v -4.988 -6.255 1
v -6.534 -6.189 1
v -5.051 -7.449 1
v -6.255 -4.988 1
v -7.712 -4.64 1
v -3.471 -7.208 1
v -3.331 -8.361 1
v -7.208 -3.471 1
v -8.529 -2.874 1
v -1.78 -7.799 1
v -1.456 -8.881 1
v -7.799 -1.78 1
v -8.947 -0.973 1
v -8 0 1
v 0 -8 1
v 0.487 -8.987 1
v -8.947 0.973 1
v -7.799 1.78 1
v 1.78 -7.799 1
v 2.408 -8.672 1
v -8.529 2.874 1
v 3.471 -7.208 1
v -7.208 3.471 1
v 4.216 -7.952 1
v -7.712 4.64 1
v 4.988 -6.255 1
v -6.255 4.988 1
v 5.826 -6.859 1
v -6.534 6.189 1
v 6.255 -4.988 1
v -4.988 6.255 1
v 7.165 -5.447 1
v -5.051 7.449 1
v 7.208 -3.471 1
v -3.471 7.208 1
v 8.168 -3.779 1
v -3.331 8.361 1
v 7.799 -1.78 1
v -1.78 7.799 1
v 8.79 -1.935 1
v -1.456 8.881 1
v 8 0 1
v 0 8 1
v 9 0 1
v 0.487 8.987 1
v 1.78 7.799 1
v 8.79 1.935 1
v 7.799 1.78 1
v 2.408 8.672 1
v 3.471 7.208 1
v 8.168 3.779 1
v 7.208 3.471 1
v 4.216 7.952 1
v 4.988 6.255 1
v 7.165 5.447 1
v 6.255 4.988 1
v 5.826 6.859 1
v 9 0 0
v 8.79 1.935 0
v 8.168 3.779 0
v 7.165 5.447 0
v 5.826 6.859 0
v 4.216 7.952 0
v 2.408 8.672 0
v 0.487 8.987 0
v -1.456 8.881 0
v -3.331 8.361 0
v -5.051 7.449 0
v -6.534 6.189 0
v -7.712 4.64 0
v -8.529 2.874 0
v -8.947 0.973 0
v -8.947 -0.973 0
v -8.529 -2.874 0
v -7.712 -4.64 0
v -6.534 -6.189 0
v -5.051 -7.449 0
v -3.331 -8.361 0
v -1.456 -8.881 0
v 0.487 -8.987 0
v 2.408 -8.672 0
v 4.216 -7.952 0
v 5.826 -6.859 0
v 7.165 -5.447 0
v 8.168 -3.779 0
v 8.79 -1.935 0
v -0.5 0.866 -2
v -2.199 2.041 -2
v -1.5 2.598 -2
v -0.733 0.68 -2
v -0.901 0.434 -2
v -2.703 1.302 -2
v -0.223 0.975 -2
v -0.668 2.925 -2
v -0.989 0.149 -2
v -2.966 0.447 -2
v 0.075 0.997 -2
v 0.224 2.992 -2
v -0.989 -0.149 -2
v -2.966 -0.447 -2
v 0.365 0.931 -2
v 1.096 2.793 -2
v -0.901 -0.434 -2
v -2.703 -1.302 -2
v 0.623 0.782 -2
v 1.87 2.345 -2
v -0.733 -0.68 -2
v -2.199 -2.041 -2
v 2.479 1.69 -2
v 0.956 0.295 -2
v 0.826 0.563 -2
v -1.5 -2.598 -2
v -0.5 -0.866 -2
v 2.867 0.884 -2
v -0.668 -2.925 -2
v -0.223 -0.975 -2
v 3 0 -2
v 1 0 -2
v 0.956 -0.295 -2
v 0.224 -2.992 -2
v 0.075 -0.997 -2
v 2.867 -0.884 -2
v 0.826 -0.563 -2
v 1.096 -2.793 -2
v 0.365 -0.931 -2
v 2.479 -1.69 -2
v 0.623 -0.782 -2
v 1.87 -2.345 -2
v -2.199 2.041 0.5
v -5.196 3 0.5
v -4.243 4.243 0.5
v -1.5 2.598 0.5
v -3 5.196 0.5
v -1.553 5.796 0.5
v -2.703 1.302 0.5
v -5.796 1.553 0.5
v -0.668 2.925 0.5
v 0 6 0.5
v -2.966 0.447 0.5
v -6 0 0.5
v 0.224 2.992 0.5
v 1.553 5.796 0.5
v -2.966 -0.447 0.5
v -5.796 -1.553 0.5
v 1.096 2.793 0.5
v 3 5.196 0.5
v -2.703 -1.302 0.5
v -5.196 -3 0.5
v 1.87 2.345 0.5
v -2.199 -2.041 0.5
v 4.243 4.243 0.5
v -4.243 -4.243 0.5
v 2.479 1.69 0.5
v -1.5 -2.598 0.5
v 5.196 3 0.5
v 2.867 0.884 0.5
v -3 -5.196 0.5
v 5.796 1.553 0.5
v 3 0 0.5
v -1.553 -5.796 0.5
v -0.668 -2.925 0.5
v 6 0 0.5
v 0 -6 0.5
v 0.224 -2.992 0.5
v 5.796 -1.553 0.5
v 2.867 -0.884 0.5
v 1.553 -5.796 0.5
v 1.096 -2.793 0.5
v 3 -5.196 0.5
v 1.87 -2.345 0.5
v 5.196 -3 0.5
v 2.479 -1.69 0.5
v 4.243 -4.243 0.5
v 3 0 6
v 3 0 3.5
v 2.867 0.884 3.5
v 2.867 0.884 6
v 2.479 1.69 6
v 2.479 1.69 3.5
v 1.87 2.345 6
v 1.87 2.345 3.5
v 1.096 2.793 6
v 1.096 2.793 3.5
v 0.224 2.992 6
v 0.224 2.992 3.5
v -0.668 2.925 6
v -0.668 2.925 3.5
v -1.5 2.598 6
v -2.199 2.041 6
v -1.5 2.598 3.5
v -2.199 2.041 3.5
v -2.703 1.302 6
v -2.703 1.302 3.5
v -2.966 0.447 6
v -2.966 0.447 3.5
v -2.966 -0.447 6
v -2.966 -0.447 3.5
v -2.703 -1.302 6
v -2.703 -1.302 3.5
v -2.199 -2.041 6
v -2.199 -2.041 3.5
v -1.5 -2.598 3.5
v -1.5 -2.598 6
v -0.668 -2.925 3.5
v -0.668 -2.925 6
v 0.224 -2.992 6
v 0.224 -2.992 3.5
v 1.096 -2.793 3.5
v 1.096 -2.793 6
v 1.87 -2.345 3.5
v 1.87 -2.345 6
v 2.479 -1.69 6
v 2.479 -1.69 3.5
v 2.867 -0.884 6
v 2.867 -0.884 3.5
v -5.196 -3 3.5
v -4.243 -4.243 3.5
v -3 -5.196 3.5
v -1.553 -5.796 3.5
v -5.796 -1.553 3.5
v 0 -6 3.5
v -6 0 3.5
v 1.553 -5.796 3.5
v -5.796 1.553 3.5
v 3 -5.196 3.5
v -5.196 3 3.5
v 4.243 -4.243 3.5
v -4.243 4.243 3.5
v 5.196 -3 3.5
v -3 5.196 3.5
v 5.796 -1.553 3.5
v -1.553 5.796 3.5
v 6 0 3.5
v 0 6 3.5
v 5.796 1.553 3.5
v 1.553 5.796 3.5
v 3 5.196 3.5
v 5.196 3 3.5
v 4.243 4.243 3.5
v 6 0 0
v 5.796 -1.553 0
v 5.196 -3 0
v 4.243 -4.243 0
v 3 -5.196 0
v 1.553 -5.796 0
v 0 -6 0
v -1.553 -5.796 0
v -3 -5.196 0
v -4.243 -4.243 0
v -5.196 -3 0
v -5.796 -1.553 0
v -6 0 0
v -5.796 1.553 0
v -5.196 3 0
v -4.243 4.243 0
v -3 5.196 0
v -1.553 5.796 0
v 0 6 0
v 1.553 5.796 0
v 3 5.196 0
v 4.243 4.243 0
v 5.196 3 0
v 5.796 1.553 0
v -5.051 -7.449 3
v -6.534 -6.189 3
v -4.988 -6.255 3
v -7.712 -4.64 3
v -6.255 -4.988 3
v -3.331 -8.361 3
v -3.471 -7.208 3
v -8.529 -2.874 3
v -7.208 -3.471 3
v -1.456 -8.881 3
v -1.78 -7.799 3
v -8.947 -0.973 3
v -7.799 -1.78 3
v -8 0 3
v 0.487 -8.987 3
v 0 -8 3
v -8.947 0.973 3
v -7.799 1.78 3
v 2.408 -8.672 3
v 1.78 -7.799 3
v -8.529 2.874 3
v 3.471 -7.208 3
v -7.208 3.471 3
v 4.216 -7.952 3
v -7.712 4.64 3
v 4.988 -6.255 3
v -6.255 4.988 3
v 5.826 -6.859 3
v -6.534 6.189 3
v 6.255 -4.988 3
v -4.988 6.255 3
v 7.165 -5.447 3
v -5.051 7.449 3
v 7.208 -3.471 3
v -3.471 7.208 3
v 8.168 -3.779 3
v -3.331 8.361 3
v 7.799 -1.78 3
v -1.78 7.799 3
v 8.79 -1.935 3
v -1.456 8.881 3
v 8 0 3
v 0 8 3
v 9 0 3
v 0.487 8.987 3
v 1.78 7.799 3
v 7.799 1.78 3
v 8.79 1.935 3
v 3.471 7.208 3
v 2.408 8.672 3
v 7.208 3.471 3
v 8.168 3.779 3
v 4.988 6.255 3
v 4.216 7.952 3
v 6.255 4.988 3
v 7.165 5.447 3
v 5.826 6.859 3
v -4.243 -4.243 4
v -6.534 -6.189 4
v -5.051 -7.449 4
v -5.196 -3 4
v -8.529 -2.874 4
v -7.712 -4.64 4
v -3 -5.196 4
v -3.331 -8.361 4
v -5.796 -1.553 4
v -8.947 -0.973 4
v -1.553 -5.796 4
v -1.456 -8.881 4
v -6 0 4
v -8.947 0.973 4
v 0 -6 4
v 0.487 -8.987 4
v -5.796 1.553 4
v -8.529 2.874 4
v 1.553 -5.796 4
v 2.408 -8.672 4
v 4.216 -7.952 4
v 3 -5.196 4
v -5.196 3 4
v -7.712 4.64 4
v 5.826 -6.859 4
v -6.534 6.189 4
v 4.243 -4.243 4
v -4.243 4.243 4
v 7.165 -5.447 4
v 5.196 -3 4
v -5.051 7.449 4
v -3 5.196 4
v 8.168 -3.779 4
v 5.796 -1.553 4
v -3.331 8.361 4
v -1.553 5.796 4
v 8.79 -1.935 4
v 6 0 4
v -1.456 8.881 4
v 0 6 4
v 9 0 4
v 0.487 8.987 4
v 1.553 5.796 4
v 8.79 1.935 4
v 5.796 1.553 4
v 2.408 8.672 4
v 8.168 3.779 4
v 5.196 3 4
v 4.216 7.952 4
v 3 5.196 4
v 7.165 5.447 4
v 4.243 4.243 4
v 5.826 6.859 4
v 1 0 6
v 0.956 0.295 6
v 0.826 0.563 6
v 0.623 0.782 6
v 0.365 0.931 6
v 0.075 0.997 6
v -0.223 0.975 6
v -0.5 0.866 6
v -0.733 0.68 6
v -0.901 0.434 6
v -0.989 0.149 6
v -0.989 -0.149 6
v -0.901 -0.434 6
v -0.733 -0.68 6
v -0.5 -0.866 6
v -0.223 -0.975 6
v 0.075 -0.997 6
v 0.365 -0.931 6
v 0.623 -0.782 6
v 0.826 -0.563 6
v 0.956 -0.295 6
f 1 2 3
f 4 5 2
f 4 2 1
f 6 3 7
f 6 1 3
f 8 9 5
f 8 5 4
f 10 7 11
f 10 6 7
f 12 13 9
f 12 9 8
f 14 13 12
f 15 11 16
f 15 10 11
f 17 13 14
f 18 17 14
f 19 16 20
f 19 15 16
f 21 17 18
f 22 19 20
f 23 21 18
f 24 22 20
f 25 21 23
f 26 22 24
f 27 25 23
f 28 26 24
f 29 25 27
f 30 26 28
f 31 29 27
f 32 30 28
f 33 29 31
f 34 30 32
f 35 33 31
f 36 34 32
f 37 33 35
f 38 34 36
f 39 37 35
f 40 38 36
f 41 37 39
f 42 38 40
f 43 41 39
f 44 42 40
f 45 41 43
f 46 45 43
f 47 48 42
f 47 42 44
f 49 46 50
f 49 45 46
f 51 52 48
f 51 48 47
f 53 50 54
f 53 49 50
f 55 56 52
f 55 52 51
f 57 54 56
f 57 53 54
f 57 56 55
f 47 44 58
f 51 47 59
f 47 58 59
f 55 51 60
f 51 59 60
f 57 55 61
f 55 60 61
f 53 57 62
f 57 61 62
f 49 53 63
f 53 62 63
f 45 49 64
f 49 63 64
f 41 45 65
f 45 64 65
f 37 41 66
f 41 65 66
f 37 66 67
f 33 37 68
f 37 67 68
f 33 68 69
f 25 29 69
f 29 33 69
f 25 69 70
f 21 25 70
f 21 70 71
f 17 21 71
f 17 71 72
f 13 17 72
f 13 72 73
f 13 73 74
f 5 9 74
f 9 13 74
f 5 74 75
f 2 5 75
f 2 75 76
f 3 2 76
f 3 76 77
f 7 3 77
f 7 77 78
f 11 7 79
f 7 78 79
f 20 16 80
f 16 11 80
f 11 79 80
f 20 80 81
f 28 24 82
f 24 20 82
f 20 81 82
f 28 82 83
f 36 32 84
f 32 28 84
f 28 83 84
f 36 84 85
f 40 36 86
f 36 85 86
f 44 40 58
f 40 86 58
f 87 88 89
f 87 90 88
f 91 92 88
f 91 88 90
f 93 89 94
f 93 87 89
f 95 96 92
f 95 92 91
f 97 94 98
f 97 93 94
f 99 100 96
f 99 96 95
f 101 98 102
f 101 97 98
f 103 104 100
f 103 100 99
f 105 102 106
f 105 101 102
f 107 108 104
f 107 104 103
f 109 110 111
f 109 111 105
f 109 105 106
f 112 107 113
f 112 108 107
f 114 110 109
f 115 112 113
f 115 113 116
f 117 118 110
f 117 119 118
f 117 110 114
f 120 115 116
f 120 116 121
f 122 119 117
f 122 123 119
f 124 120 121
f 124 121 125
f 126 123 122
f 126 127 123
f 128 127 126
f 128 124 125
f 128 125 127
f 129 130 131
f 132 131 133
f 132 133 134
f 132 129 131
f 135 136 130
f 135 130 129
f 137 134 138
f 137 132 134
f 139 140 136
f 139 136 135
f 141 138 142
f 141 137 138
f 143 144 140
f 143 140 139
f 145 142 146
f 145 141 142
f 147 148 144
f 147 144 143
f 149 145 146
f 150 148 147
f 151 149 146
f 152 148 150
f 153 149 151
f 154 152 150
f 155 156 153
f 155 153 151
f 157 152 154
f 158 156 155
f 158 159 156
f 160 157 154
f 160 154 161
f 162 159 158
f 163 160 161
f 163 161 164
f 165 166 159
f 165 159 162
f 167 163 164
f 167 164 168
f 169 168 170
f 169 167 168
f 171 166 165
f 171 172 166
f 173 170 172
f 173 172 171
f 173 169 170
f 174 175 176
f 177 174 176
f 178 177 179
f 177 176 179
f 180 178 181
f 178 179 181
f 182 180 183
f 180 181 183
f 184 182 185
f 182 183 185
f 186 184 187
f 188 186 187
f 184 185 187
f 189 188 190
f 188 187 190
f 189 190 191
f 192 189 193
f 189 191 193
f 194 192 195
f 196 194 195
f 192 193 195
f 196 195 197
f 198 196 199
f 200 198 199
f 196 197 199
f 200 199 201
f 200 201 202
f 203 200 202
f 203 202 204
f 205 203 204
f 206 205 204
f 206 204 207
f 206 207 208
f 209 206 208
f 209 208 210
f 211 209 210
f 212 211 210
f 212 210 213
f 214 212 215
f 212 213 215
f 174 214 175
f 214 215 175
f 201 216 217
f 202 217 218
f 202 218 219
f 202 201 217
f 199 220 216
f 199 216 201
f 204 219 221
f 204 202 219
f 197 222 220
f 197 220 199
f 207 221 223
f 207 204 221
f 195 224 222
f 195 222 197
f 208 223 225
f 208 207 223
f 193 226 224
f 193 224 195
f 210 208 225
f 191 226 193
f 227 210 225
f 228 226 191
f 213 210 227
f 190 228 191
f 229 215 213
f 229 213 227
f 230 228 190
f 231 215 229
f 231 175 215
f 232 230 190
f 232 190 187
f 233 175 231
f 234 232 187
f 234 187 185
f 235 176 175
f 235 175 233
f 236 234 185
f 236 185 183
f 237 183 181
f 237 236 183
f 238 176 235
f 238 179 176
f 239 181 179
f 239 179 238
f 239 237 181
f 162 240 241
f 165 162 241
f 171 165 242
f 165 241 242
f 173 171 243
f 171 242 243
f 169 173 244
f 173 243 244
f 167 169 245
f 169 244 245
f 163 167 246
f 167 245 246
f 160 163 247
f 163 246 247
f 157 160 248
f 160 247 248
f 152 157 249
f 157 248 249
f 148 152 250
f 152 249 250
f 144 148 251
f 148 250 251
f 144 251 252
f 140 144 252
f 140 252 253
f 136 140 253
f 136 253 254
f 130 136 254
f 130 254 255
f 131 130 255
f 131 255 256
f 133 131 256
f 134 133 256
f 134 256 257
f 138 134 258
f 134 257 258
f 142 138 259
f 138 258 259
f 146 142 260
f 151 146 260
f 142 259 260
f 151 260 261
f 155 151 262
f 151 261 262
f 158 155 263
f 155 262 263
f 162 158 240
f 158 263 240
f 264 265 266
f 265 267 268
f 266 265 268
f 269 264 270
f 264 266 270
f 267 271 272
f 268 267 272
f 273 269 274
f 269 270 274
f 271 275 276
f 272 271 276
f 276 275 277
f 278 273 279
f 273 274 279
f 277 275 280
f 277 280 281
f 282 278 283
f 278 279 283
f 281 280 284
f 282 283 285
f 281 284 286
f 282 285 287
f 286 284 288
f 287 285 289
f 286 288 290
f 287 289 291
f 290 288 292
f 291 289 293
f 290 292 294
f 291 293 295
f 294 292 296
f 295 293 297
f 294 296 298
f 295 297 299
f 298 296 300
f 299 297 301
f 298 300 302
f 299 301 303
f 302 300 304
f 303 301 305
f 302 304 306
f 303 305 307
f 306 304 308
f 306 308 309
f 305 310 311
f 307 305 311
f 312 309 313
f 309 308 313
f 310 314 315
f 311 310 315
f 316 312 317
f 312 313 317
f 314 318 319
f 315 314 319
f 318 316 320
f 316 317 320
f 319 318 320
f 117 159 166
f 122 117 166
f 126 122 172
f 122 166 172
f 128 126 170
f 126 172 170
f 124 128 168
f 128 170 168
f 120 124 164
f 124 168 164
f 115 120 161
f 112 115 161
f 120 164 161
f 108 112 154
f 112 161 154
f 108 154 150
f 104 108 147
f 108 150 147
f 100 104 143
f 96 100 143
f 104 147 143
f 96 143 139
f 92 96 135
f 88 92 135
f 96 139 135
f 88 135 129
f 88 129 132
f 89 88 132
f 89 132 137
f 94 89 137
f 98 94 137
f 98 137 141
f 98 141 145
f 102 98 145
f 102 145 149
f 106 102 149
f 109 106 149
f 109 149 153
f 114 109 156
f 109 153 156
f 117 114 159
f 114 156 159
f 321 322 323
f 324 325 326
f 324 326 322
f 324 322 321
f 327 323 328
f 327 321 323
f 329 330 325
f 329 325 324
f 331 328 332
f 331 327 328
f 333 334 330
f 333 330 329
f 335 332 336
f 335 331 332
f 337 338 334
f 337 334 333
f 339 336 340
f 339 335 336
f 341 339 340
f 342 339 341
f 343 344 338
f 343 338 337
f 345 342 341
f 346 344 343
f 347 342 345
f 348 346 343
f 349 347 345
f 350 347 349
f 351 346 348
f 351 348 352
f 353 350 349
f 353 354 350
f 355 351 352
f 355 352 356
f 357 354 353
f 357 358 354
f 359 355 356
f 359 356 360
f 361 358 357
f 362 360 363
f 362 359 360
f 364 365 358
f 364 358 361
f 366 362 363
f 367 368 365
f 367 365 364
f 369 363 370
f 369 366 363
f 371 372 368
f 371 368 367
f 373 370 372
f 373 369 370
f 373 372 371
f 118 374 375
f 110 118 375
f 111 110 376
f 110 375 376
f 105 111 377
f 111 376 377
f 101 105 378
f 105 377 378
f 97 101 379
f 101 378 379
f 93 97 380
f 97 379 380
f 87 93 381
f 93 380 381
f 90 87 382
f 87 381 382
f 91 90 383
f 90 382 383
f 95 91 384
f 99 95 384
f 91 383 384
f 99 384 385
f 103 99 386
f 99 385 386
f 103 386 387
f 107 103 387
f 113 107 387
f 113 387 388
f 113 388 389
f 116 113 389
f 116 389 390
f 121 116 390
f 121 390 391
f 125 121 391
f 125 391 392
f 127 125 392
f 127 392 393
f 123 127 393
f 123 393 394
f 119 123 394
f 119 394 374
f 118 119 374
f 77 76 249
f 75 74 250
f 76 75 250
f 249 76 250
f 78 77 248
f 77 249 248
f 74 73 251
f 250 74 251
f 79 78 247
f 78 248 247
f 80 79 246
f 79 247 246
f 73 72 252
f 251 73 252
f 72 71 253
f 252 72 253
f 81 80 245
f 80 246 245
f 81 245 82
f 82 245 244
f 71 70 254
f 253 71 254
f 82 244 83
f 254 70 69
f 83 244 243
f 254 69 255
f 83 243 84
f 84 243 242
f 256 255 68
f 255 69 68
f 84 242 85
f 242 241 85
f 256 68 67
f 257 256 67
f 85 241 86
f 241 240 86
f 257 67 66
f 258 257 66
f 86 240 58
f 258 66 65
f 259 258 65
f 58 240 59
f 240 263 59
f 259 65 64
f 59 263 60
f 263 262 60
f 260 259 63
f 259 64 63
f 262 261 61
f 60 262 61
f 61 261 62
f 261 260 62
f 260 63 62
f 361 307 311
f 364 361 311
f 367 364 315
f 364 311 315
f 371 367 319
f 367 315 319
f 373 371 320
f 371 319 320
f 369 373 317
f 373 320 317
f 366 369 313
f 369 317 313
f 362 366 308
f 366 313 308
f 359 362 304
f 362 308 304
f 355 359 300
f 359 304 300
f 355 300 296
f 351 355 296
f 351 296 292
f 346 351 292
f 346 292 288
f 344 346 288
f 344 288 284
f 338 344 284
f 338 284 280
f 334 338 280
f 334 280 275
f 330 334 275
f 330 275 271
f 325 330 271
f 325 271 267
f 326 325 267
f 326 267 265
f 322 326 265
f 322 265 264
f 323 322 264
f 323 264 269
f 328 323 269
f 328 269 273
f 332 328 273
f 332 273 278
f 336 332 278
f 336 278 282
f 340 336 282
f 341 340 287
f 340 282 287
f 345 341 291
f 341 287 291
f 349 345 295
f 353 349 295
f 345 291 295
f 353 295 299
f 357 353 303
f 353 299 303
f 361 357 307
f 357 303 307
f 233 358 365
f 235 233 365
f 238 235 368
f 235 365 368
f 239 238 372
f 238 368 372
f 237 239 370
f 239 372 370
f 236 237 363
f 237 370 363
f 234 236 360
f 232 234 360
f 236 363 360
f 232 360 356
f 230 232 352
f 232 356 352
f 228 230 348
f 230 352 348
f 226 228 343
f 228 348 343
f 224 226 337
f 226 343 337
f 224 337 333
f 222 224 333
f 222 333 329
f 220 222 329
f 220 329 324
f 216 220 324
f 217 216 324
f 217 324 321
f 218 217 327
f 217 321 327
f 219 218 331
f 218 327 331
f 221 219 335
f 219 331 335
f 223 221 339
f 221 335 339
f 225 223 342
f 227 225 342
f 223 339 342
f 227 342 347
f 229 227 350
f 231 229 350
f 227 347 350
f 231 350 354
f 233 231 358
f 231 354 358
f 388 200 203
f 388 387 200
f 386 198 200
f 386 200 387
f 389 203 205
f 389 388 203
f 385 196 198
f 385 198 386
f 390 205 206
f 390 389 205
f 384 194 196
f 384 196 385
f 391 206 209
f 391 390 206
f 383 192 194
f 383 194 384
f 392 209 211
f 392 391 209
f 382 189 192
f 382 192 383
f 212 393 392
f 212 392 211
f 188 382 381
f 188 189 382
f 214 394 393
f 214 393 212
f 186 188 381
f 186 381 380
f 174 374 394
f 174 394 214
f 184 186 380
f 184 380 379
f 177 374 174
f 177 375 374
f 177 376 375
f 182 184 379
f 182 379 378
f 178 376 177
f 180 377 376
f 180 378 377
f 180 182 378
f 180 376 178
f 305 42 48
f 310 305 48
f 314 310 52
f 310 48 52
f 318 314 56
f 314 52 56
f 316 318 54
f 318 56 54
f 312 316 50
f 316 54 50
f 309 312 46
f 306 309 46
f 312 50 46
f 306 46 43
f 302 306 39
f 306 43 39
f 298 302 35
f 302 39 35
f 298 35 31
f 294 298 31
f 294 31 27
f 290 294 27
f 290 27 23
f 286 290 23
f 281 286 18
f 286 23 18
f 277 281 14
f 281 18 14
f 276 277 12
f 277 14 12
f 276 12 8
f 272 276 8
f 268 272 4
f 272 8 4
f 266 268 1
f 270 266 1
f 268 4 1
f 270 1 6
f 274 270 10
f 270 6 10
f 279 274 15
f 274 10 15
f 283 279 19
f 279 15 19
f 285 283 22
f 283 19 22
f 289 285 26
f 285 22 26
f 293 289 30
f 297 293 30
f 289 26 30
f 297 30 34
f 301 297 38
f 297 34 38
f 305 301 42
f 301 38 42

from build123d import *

# Parameters (mm, degrees)
F0_R      = 9
F1_DEPTH  = 4
F2_R      = 6
F3_DEPTH  = 0.5
F4_R      = 6
F5_DEPTH  = 0.5
F6_R      = 3
F7_DEPTH  = 2.5
F8_R      = 3
F9_DEPTH  = 2.5
F10_R     = 1
F11_DEPTH = 25
F13_R     = 15.851527
F13_R_2   = 8
F14_DEPTH = 2


with BuildPart() as f1:
    # F0 (on Top) → F1 (new body)
    with BuildSketch(Plane.XY):
        Circle(F0_R)
    extrude(amount=F1_DEPTH)

    # F2 (on face) → F3 (cut)
    with BuildSketch(Plane(origin=(0, 0, 0), x_dir=(1, 0, 0), z_dir=(0, 0, -1))):
        Circle(F2_R)
    extrude(amount=-F3_DEPTH, mode=Mode.SUBTRACT)

    # F4 (on face) → F5 (cut)
    with BuildSketch(Plane.XY.offset(4)):
        Circle(F4_R)
    extrude(amount=-F5_DEPTH, mode=Mode.SUBTRACT)

    # F6 (on face) → F7 (join)
    with BuildSketch(Plane(origin=(0, 0, 0.5), x_dir=(1, 0, 0), z_dir=(0, 0, -1))):
        Circle(F6_R)
    extrude(amount=F7_DEPTH)

    # F8 (on face) → F9 (join)
    with BuildSketch(Plane.XY.offset(3.5)):
        Circle(F8_R)
    extrude(amount=F9_DEPTH)

    # F10 (on face) → F11 (cut)
    with BuildSketch(Plane.XY.offset(6)):
        Circle(F10_R)
    extrude(amount=-F11_DEPTH, mode=Mode.SUBTRACT)

    # F13 (on offset) → F14 (cut)
    with BuildSketch(Plane.XY.offset(1)):
        Circle(F13_R)
        Circle(F13_R_2, mode=Mode.SUBTRACT)
    extrude(amount=F14_DEPTH, mode=Mode.SUBTRACT)


solid = f1.part
